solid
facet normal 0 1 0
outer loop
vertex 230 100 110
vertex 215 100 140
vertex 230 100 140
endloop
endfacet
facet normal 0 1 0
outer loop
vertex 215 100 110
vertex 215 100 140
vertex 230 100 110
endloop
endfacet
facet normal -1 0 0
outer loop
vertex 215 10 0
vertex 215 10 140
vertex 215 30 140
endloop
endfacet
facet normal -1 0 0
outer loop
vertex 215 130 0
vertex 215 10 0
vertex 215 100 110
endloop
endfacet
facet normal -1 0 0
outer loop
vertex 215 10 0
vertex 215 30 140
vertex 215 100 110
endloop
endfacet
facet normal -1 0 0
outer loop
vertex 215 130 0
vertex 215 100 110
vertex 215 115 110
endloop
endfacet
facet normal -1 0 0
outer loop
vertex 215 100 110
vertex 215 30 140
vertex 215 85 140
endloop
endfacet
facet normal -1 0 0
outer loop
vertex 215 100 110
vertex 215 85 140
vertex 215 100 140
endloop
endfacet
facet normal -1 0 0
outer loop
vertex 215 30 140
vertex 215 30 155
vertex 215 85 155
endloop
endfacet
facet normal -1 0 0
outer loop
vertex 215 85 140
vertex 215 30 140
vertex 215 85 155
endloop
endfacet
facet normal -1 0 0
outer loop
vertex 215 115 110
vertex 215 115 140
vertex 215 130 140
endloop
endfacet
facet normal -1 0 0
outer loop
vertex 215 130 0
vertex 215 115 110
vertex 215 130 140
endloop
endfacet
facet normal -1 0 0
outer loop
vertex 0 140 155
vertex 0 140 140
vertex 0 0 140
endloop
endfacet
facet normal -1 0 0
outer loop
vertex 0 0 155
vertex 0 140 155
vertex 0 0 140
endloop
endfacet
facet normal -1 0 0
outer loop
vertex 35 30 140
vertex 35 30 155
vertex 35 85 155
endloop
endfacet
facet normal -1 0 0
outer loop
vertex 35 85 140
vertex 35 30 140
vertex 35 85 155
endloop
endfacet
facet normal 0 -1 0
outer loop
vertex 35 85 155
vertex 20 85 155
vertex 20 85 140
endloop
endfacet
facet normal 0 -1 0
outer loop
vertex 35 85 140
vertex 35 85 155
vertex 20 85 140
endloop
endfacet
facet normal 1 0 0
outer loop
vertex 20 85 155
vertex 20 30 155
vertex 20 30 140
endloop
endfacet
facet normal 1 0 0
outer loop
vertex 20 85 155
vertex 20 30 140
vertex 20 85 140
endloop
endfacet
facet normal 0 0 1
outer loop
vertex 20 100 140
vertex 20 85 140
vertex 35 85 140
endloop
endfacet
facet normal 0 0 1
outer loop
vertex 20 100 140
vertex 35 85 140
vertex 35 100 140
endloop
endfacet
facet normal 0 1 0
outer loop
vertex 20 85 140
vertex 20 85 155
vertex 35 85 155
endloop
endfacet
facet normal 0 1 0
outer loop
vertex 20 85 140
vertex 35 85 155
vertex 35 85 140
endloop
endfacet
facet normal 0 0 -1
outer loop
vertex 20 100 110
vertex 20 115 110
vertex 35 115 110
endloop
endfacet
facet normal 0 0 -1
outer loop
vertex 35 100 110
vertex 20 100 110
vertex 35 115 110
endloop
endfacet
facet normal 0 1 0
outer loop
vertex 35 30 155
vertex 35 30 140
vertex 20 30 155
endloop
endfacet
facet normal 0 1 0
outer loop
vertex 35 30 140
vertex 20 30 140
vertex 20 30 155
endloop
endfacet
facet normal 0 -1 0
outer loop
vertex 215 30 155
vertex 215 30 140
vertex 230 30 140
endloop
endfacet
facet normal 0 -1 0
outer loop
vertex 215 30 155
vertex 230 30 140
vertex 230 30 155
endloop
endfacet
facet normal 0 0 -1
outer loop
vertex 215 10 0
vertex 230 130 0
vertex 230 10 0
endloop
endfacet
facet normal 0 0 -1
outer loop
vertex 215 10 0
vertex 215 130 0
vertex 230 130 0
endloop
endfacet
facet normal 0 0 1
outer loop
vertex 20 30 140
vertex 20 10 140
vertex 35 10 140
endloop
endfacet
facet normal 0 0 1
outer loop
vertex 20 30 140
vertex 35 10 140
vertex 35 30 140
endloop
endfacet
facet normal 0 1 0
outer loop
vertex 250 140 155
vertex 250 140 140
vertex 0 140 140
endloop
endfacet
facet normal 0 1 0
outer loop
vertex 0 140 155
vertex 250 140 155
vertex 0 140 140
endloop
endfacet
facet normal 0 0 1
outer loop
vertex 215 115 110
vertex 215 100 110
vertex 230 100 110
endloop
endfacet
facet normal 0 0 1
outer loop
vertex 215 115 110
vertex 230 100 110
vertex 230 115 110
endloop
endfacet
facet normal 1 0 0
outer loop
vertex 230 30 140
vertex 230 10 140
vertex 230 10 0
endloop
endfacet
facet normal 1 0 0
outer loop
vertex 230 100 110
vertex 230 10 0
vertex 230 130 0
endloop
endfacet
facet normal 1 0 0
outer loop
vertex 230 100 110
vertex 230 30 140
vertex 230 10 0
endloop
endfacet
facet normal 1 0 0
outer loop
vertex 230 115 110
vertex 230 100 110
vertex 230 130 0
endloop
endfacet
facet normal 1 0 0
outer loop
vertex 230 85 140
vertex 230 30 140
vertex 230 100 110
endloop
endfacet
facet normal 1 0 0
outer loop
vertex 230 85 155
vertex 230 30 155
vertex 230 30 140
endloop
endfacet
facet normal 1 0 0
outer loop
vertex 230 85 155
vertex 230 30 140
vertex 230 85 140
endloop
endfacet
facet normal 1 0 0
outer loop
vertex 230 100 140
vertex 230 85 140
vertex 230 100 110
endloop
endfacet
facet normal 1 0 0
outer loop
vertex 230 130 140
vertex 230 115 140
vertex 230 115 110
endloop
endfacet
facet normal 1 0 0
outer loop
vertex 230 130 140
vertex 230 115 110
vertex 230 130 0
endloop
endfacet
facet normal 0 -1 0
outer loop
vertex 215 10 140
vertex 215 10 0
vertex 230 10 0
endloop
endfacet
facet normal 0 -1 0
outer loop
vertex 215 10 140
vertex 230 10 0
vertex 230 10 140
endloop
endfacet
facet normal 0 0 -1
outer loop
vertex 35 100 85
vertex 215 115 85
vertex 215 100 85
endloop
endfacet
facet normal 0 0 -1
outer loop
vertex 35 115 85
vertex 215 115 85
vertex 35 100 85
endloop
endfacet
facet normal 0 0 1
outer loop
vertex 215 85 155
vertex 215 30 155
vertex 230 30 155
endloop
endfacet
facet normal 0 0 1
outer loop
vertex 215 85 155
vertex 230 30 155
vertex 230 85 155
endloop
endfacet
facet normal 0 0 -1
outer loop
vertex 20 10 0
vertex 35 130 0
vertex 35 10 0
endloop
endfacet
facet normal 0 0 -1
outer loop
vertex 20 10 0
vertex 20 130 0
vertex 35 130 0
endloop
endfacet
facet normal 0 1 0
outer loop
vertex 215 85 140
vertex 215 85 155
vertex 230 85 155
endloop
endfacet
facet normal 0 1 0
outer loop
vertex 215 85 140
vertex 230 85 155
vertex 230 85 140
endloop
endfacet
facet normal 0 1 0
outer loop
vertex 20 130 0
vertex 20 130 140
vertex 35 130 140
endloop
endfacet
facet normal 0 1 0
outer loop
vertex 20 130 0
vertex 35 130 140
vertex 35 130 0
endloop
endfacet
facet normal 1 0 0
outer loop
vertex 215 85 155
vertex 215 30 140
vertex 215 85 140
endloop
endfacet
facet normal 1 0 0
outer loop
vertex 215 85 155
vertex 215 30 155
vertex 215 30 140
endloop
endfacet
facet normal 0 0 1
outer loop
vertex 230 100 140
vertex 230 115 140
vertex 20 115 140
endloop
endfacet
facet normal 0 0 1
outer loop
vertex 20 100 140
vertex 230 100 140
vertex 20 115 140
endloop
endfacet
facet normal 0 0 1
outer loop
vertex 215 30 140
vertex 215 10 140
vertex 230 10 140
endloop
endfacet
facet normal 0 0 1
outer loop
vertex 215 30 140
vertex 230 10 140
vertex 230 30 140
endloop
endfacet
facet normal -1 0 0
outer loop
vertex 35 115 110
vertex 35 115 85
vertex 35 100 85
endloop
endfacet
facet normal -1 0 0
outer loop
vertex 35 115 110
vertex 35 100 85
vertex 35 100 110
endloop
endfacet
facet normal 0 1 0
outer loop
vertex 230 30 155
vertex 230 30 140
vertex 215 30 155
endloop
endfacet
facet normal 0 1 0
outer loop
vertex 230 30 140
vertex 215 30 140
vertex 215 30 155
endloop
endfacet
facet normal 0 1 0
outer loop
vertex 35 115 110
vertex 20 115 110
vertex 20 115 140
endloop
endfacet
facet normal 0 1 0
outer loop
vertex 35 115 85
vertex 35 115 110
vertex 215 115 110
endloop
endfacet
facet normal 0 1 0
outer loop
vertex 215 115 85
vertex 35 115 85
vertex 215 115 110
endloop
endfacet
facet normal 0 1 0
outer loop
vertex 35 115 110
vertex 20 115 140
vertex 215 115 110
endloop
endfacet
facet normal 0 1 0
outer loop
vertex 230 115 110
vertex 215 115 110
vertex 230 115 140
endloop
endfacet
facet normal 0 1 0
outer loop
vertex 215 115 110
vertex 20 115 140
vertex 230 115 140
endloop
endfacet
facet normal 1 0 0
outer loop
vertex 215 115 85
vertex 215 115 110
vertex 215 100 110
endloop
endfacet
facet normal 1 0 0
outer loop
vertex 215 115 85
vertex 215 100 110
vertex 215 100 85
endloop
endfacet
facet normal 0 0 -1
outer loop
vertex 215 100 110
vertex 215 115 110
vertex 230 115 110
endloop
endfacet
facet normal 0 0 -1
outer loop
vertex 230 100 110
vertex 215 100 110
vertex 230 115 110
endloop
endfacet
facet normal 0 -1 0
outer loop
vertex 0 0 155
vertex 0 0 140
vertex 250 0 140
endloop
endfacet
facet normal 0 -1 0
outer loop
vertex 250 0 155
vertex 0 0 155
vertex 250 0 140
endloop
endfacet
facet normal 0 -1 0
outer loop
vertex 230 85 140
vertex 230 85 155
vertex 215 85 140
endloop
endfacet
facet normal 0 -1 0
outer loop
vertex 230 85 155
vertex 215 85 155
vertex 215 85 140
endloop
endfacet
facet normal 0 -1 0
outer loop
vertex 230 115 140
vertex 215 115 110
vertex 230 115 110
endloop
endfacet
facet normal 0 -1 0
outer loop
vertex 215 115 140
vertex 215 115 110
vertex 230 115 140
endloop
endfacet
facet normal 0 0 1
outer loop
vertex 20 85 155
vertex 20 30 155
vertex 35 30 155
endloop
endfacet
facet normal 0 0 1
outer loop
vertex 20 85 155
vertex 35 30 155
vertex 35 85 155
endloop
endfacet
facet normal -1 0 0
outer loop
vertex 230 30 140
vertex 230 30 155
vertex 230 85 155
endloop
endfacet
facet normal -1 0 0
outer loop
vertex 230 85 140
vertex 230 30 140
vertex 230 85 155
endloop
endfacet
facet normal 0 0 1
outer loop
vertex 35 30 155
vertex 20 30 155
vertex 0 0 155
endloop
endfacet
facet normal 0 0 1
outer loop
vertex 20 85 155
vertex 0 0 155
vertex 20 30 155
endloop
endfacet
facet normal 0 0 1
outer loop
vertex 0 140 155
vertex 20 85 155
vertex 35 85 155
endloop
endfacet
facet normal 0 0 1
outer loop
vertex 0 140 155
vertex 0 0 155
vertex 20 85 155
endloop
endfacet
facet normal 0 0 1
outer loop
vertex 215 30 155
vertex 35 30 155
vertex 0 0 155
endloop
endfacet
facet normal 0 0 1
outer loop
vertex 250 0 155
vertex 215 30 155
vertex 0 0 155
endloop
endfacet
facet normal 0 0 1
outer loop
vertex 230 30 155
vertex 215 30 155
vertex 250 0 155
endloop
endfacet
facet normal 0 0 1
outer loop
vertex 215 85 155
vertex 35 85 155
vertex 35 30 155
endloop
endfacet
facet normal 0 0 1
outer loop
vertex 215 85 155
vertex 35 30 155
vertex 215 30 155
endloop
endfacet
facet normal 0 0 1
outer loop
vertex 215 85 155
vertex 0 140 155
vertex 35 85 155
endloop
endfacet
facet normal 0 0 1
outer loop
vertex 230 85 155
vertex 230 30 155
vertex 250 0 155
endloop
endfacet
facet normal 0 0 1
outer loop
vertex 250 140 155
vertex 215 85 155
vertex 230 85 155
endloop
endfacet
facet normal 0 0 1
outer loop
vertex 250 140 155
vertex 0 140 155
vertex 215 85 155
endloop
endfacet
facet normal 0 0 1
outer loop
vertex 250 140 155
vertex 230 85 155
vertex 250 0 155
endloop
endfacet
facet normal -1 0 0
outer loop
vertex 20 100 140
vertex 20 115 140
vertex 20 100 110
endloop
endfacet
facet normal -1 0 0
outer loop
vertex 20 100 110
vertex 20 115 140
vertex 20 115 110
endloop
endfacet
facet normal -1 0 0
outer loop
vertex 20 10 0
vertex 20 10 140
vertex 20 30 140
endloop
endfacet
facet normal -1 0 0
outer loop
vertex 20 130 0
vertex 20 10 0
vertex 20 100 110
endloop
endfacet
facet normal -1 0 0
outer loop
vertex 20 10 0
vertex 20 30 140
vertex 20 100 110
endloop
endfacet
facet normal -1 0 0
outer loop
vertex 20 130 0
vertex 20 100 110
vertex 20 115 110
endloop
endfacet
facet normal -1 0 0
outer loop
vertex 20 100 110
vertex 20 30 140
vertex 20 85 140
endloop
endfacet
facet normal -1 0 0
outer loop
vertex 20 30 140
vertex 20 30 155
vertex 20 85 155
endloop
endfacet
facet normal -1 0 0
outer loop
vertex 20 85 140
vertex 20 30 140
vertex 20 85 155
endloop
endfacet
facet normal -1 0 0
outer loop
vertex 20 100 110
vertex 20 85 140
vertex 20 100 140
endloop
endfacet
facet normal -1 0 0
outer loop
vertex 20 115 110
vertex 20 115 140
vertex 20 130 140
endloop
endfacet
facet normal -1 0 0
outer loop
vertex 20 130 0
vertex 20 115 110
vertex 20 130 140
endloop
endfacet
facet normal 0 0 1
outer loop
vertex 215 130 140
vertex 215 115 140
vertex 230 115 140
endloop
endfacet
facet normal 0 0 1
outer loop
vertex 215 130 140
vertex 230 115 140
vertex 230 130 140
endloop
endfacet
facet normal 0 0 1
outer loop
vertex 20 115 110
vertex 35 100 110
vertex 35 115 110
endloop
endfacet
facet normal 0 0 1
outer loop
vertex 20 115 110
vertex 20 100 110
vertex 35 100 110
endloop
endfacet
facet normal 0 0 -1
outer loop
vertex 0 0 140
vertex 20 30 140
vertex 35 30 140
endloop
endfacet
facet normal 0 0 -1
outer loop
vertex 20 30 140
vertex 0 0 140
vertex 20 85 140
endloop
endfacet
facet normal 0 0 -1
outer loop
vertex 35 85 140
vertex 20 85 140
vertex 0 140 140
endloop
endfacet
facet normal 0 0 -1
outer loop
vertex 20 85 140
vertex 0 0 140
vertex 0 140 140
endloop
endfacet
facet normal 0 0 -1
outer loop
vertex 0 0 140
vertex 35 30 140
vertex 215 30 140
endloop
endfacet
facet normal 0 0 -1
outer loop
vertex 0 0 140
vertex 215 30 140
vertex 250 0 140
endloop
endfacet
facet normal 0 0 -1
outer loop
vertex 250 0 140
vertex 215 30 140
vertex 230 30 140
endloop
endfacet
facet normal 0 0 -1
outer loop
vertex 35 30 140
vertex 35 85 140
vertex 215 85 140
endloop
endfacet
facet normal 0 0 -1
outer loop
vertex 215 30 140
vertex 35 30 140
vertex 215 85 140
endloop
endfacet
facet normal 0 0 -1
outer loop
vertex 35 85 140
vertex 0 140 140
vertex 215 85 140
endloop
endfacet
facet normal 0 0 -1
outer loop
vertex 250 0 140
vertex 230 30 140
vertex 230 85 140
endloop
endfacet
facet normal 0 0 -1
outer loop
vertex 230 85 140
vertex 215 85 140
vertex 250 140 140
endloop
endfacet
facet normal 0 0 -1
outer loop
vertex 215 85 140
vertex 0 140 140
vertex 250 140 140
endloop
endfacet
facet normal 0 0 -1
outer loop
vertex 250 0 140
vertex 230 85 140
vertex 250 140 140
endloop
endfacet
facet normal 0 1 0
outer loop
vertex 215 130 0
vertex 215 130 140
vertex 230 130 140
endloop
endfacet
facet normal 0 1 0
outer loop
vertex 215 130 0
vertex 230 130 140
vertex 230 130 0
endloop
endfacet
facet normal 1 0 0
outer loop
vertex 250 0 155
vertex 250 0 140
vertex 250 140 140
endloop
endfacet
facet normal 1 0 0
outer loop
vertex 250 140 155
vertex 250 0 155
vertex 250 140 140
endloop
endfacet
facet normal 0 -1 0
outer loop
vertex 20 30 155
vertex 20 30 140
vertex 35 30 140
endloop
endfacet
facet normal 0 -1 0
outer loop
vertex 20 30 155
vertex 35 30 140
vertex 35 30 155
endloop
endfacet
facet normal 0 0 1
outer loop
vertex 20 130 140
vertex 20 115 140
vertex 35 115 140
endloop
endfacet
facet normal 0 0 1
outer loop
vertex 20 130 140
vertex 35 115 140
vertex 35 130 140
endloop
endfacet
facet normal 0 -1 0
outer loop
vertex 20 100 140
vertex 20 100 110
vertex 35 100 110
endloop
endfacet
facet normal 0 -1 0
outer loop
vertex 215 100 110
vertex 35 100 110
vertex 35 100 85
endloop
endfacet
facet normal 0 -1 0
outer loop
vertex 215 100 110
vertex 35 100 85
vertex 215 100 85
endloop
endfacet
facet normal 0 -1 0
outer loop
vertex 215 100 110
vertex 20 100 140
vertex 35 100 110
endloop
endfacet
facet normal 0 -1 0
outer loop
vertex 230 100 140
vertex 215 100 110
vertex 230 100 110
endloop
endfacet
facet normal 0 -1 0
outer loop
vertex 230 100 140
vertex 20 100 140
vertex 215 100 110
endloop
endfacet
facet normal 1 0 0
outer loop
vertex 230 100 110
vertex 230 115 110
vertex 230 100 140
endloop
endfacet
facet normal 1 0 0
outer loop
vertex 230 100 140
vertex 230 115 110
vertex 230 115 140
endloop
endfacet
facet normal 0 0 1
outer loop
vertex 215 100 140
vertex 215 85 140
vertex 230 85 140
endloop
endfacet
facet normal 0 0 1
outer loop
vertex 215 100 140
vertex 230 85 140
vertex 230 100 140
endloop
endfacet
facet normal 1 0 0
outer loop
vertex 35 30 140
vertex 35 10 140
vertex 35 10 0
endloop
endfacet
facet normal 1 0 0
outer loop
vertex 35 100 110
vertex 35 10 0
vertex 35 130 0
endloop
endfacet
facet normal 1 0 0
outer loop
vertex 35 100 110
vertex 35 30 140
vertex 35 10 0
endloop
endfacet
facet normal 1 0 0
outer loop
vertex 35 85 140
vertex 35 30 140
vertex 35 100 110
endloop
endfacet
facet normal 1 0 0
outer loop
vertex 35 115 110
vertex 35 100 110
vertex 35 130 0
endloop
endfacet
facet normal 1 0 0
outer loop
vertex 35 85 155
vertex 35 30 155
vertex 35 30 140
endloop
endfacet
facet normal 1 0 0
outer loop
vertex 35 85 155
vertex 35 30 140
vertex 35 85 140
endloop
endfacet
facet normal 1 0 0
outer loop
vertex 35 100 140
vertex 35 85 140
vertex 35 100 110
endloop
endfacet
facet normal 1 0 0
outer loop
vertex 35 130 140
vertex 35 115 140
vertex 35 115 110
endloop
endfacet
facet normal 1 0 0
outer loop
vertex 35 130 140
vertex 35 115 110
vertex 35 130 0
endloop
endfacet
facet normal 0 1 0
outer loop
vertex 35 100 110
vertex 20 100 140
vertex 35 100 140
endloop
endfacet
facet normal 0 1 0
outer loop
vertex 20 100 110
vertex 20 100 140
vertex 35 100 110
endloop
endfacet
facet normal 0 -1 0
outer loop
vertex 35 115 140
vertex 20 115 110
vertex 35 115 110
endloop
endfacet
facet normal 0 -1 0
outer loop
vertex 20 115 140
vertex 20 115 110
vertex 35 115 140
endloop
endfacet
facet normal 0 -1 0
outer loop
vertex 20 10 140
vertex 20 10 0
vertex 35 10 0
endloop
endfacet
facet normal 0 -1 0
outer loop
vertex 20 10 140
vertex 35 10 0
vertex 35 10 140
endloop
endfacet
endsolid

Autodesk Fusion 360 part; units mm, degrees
sketch "TableLegSketch" plane through (0, 0, 0) normal (1, 0, 0) x (0, 1, 0)
  line L0 (0, 0) -> (10, 0)
  line L1 (10, 0) -> (10, 140)
  line L2 (10, 140) -> (0, 140)
  line L3 (0, 140) -> (0, 0)
  line L4 (130, 140) -> (130, 0)
  line L5 (130, 0) -> (10, 0)
  line L6 (10, 0) -> (10, 140)
  line L7 (130, 140) -> (140, 140)
  line L8 (140, 140) -> (140, 0)
  line L9 (140, 0) -> (130, 0)
  line L10 (130, 0) -> (130, 140)
  line L11 (100, 140) -> (100, 110)
  line L12 (100, 110) -> (115, 110)
  line L13 (115, 110) -> (115, 140)
  line L14 (115, 140) -> (130, 140)
  line L15 (30, 140) -> (30, 155)
  line L16 (30, 155) -> (85, 155)
  line L17 (85, 155) -> (85, 140)
  line L18 (10, 140) -> (30, 140)
  line L19 (85, 140) -> (100, 140)
  dimension "d3" = 10
  dimension "d4" = 140
extrude "Extrude1" add sketch "TableLegSketch" along normal blind 15 from surface at 20 contours L1 L4 L5 L6 L10 L11 L12 L13 L14 L15 L16 L17 L18 L19 makes body 1
extrude "Extrude2" add 1 faces at (35, 80, 36.6667) along direction (1, 0, 0) blind 15 from surface at 180 on bodies 1 bodies 1 makes body 2
sketch "TableTop" plane through (0, 0, 0) normal (0, 0, 1) x (1, 0, 0)
  line L0 (0, 0) -> (250, 0)
  line L1 (250, 0) -> (250, 140)
  line L2 (250, 140) -> (0, 140)
  line L3 (0, 140) -> (0, 0)
  dimension "d11" = 250
  dimension "d12" = 140
extrude "Extrude3" add sketch "TableTop" along normal blind 15 from surface at 140 separate body makes body 3
sketch "MiddleSupportSketch" plane through (0, 115, 0) normal (0, -1, 0) x (1, 0, 0)
  line L0 (20, 140) -> (20, 110)
  line L1 (20, 110) -> (35, 110)
  line L2 (35, 110) -> (35, 140)
  line L3 (35, 140) -> (20, 140)
  line L4 (230, 110) -> (230, 140)
  line L5 (230, 140) -> (20, 140)
  line L6 (20, 140) -> (20, 110)
  line L7 (215, 110) -> (215, 85)
  line L8 (215, 85) -> (35, 85)
  line L9 (35, 85) -> (35, 110)
  line L10 (20, 110) -> (35, 110)
  line L11 (215, 110) -> (230, 110)
extrude "Extrude4" add sketch "MiddleSupportSketch" along normal blind 15 separate body makes body 4
combine "Combine1" operation cut target body 3 tool bodies 1 keep tools
combine "Combine2" operation cut target body 3 tool bodies 2 keep tools
sketch "TABLETOP" plane through (0, 0, 155) normal (0, 0, 1) x (-1, 0, 0)
  line L0 (-215, -85) -> (-230, -85)
  line L1 (-230, -85) -> (-230, -30)
  line L2 (-230, -30) -> (-215, -30)
  line L3 (-215, -30) -> (-215, -85)
  line L4 (-20, -85) -> (-35, -85)
  line L5 (-35, -85) -> (-35, -30)
  line L6 (-35, -30) -> (-20, -30)
  line L7 (-20, -30) -> (-20, -85)
  line L8 (0, -140) -> (0, 0)
  line L9 (0, 0) -> (-250, 0)
  line L10 (-250, 0) -> (-250, -140)
  line L11 (-250, -140) -> (0, -140)
sketch "LEGS" plane through (35, 0, 0) normal (1, 0, 0) x (0, 1, 0)
  line L0 (130, 0) -> (130, 140)
  line L1 (130, 140) -> (115, 140)
  line L2 (115, 140) -> (115, 110)
  line L3 (115, 110) -> (100, 110)
  line L4 (100, 110) -> (100, 140)
  line L5 (100, 140) -> (85, 140)
  line L6 (85, 140) -> (85, 155)
  line L7 (85, 155) -> (30, 155)
  line L8 (30, 155) -> (30, 140)
  line L9 (30, 140) -> (10, 140)
  line L10 (10, 140) -> (10, 0)
  line L11 (10, 0) -> (130, 0)
sketch "MIDDLESUPPORT" plane through (0, 100, 0) normal (0, -1, 0) x (1, 0, 0)
  line L0 (215, 85) -> (215, 110)
  line L1 (215, 110) -> (230, 110)
  line L2 (230, 110) -> (230, 140)
  line L3 (230, 140) -> (20, 140)
  line L4 (20, 140) -> (20, 110)
  line L5 (20, 110) -> (35, 110)
  line L6 (35, 110) -> (35, 85)
  line L7 (35, 85) -> (215, 85)
